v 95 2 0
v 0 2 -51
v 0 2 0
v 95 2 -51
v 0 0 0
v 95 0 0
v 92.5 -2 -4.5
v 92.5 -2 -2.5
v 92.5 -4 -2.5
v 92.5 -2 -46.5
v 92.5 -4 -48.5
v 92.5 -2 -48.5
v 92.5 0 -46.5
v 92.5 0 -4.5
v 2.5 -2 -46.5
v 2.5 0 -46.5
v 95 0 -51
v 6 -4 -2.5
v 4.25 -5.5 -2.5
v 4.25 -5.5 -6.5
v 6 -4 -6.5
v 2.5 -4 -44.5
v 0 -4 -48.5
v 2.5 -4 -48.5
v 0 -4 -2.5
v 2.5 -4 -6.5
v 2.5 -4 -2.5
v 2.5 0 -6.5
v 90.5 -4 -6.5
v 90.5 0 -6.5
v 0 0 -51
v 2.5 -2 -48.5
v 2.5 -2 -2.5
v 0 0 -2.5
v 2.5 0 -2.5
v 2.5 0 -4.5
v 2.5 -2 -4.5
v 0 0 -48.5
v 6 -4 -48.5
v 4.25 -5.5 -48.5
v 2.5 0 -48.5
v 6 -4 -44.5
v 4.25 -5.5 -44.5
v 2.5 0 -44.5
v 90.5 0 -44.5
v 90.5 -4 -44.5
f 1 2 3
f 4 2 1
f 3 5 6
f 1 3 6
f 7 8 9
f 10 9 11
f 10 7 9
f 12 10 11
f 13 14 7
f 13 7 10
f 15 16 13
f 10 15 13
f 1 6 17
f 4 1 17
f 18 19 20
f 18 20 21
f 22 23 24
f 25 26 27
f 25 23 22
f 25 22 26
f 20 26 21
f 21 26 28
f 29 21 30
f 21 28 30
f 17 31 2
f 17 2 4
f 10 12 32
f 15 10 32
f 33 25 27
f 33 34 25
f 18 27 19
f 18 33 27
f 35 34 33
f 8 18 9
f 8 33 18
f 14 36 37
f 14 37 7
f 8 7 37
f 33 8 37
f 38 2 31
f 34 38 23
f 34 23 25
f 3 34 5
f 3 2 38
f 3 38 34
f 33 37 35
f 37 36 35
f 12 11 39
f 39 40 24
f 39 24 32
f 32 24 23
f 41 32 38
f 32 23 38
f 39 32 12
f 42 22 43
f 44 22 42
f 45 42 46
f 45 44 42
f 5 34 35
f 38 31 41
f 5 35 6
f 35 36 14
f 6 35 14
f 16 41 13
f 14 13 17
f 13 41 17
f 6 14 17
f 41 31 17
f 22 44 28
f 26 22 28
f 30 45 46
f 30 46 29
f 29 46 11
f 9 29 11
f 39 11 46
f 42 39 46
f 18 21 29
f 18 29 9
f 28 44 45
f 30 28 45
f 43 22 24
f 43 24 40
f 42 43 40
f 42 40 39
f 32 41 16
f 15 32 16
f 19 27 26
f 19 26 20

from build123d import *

# Parameters (mm, degrees)
ESBO_O1_W                = 95
ESBO_O1_H                = 51
RESSALTO_EXTRUS_O1_DEPTH = 2
ESBO_O3_W                = 90
ESBO_O3_H                = 2
RESSALTO_EXTRUS_O3_DEPTH = 2
ESBO_O5_W                = 90
ESBO_O5_H                = 2
RESSALTO_EXTRUS_O4_DEPTH = 2
ESBO_O6_W                = 2
ESBO_O6_H                = 42
RESSALTO_EXTRUS_O5_DEPTH = 4
ESBO_O7_W                = 90
ESBO_O7_H                = 4
RESSALTO_EXTRUS_O6_DEPTH = 2
ESBO_O8_W                = 46
ESBO_O8_H                = 4
RESSALTO_EXTRUS_O7_DEPTH = 2.5
ESBO_O10_W               = 3.5
ESBO_O10_H               = 4
RESSALTO_EXTRUS_O8_DEPTH = 1.5
CORTE_EXTRUS_O1_DEPTH    = 52.5
CORTE_EXTRUS_O2_DEPTH    = 62.5


with BuildPart() as part:
    # Esboço1 → Ressalto-extrusão1 (new body)
    with BuildSketch(Plane(origin=(0, 0, 0), x_dir=(1, 0, 0), z_dir=(0, 1, 0))):
        with Locations((47.5, 25.5)):
            Rectangle(ESBO_O1_W, ESBO_O1_H)
    extrude(amount=RESSALTO_EXTRUS_O1_DEPTH)

    # Esboço3 → Ressalto-extrusão3 (add)
    with BuildSketch(Plane(origin=(0, 0, 0), x_dir=(-1, 0, 0), z_dir=(0, -1, 0))):
        with Locations((-47.5, 5.5)):
            Rectangle(ESBO_O3_W, ESBO_O3_H)
    extrude(amount=RESSALTO_EXTRUS_O3_DEPTH)

    # Esboço5 → Ressalto-extrusão4 (add)
    with BuildSketch(Plane.XZ):
        with Locations((47.5, -45.5)):
            Rectangle(ESBO_O5_W, ESBO_O5_H)
    extrude(amount=RESSALTO_EXTRUS_O4_DEPTH)

    # Esboço6 → Ressalto-extrusão5 (add)
    with BuildSketch(Plane.XZ):
        with Locations((91.5, -25.5)):
            Rectangle(ESBO_O6_W, ESBO_O6_H)
    extrude(amount=RESSALTO_EXTRUS_O5_DEPTH)

    # Esboço7 → Ressalto-extrusão6 (add)
    with BuildSketch(Plane(origin=(0, -2, 0), x_dir=(-1, 0, 0), z_dir=(0, -1, 0))):
        with Locations((-47.5, 4.5)):
            Rectangle(ESBO_O7_W, ESBO_O7_H)
        with Locations((-47.5, 46.5)):
            Rectangle(ESBO_O7_W, ESBO_O7_H)
    extrude(amount=RESSALTO_EXTRUS_O6_DEPTH)

    # Esboço8 → Ressalto-extrusão7 (add)
    with BuildSketch(Plane.ZY):
        with Locations((-25.5, -2)):
            Rectangle(ESBO_O8_W, ESBO_O8_H)
    extrude(amount=-RESSALTO_EXTRUS_O7_DEPTH)

    # Esboço10 → Ressalto-extrusão8 (add)
    with BuildSketch(Plane.XZ.offset(4)):
        with Locations((4.25, -4.5)):
            Rectangle(ESBO_O10_W, ESBO_O10_H)
        with Locations((4.25, -46.5)):
            Rectangle(ESBO_O10_W, ESBO_O10_H)
    extrude(amount=RESSALTO_EXTRUS_O8_DEPTH)

    # Esboço12 → Corte-extrusão1 (cut)
    with BuildSketch(Plane.XY.offset(-2.5)):
        Polygon((2.5, -4), (4.25, -5.5), (2.5, -5.5), align=None)
    extrude(amount=-CORTE_EXTRUS_O1_DEPTH, mode=Mode.SUBTRACT)

    # Esboço13 → Corte-extrusão2 (cut)
    with BuildSketch(Plane.XY.offset(-2.5)):
        Polygon((4.25, -5.5), (6, -4), (6, -5.5), align=None)
    extrude(amount=-CORTE_EXTRUS_O2_DEPTH, mode=Mode.SUBTRACT)


solid = part.part
